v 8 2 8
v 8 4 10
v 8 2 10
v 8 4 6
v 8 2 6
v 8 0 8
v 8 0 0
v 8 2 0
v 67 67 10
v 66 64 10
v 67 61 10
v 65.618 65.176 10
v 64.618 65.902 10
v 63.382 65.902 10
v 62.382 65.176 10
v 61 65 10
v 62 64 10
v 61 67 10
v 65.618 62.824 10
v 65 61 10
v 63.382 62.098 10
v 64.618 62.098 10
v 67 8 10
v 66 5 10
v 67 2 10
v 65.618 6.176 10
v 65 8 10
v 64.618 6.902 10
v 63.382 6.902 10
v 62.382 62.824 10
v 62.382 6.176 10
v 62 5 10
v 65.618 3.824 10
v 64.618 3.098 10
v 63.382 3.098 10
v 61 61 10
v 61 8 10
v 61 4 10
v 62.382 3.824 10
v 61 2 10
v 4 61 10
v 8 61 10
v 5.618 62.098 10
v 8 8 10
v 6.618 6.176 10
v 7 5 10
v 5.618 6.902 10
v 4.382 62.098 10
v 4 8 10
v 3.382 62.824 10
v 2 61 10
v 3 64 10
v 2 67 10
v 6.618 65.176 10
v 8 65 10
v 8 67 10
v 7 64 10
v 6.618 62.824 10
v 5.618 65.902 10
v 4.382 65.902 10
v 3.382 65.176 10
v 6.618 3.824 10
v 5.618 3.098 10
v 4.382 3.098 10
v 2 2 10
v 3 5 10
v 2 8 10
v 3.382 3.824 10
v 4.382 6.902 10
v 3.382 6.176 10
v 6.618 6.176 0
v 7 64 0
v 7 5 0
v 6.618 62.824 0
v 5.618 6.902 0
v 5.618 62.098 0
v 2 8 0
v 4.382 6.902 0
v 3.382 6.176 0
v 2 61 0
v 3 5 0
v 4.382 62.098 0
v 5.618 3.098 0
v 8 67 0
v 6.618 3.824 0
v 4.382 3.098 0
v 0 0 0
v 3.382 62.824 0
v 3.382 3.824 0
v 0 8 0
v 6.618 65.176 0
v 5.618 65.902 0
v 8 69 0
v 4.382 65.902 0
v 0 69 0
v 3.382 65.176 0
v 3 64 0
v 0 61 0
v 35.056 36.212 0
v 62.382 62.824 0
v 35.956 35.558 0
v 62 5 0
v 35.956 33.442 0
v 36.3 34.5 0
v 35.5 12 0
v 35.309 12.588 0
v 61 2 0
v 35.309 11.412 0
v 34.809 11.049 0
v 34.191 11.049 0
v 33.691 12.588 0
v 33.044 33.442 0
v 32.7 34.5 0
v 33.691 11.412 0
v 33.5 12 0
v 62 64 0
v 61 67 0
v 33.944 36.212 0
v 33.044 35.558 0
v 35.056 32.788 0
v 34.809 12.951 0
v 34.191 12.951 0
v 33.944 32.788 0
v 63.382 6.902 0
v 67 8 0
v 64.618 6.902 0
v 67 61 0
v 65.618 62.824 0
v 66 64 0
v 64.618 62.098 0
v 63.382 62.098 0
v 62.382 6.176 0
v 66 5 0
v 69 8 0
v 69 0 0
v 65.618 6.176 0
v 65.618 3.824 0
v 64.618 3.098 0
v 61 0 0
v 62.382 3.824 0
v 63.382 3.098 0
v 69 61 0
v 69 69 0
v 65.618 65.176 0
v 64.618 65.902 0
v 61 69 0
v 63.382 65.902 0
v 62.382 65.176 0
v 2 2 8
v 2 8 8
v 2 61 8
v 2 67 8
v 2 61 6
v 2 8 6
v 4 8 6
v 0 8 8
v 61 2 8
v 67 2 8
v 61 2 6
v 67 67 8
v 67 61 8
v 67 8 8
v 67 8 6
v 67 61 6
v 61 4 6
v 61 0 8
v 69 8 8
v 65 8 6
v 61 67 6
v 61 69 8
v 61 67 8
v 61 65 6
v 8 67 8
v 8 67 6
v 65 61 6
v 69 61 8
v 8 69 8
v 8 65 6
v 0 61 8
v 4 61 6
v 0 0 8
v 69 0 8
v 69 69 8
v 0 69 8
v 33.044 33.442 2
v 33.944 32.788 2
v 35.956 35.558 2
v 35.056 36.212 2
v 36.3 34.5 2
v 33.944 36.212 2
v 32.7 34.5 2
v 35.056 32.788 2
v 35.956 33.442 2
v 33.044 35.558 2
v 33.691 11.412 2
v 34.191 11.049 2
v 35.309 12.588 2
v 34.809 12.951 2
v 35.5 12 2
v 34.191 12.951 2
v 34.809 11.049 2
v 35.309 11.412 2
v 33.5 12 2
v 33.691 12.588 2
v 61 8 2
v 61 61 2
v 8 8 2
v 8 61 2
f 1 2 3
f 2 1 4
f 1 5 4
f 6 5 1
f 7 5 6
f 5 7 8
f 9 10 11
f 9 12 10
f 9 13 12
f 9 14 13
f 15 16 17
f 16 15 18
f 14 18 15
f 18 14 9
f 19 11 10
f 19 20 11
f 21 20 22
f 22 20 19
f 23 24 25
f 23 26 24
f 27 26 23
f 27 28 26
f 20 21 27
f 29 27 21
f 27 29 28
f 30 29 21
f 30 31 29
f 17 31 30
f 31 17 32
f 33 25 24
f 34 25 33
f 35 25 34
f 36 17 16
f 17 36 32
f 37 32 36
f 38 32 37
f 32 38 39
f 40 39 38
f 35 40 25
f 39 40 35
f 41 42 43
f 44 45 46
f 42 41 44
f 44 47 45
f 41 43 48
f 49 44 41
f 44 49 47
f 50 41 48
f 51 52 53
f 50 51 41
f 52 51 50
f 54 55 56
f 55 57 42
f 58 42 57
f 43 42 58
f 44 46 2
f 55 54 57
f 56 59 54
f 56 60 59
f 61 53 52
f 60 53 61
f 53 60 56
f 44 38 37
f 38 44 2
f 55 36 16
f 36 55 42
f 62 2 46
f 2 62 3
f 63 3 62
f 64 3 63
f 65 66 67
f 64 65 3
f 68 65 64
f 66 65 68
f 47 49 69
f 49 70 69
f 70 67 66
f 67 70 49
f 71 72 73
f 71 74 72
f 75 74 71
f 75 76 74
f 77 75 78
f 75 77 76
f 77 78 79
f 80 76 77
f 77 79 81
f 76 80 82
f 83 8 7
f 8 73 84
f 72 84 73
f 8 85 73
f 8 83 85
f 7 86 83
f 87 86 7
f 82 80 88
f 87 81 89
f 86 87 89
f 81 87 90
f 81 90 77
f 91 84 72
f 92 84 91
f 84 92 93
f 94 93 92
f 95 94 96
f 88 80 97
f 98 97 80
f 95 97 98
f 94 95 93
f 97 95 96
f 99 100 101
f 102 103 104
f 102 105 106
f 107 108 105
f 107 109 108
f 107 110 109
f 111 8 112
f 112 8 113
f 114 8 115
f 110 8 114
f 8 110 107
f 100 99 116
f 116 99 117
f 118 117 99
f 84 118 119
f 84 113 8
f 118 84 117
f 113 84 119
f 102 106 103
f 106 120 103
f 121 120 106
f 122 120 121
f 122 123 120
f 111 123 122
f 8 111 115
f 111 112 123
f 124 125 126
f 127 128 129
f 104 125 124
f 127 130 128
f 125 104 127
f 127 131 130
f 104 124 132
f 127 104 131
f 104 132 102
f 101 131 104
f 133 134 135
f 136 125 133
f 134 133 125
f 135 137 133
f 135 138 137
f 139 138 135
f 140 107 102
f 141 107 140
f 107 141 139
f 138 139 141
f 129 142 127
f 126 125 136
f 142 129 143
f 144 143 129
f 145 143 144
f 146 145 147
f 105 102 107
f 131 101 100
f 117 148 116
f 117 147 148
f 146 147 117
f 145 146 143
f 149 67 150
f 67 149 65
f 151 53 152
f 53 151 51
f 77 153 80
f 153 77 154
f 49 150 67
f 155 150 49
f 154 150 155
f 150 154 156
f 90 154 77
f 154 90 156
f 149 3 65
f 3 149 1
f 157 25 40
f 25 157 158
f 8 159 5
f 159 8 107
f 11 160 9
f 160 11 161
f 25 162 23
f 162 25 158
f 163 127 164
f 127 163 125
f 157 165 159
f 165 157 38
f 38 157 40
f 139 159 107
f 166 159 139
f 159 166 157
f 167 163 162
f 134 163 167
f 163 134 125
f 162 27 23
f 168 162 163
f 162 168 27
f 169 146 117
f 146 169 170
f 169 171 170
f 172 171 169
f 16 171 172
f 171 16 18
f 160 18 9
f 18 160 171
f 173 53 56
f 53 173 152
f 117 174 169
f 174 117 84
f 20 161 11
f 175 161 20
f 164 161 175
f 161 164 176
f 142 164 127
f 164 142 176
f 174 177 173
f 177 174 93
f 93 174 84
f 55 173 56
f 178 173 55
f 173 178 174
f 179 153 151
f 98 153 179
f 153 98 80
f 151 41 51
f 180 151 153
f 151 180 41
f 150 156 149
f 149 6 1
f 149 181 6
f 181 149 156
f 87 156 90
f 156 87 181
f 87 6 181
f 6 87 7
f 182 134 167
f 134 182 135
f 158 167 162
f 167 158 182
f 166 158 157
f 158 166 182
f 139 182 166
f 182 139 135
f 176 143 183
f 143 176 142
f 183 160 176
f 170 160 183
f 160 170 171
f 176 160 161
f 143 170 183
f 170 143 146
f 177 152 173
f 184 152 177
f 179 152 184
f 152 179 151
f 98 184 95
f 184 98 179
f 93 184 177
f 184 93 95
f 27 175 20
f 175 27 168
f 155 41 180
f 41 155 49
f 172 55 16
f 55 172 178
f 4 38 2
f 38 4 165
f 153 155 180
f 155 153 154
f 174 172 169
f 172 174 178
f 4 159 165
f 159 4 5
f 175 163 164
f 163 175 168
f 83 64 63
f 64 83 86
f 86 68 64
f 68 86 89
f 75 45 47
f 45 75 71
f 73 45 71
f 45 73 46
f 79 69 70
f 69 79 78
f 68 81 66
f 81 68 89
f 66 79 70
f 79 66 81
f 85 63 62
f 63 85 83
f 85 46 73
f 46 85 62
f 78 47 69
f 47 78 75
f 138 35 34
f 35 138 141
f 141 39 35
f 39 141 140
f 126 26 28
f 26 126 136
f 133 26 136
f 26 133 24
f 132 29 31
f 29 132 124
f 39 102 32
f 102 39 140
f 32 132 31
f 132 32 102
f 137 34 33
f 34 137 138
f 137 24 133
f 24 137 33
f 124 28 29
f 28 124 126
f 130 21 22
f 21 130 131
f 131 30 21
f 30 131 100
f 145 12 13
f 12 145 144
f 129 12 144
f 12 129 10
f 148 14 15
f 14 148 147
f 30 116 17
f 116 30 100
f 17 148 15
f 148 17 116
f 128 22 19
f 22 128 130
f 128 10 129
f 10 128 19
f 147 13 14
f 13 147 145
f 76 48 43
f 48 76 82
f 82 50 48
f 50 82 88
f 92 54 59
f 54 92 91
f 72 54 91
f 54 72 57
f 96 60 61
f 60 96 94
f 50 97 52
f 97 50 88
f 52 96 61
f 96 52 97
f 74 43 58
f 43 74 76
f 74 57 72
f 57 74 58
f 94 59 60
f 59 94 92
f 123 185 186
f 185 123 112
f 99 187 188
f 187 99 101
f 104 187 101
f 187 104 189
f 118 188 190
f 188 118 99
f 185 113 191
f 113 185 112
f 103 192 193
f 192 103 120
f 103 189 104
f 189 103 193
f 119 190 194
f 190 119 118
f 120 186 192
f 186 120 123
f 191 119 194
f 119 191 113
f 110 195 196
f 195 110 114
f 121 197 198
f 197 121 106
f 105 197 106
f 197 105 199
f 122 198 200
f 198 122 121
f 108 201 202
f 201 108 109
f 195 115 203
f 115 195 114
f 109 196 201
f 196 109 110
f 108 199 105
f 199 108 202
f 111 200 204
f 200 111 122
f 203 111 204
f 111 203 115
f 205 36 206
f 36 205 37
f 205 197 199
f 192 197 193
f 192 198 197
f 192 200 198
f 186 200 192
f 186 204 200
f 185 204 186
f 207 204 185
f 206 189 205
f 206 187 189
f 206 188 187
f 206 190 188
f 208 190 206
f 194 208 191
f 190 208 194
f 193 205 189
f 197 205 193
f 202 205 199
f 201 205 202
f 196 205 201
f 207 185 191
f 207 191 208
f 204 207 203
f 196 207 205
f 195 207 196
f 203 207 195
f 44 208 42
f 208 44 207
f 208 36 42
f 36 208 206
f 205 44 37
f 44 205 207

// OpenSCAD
// Base unit

// Inputs
board_size = 50 + 3;
face_size = 4;
edge_size = 6;
corner_size = 8;
lid_holes_diameter = 4;
main_hole_diameter = 3.6;

rest_size = 3;

base_thickness = 2;
board_section_height = 5;
cap_section_height = 10;

// Parameters
face_xysize = board_size + (2 * face_size);
edge_xysize = board_size + (2 * edge_size);

face_offset = corner_size - face_size;
edge_offset = corner_size - edge_size;

total_height = 10;
points = [[0,0], [1,0], [1,1], [0,1]];
angles = [0,90,180, 270];

// Method
difference() {
    union() {
        // faces
        translate([face_offset, face_offset, 0]) {
            cube([face_xysize, face_xysize, total_height], false);
        }
        
        // bottom edges
        translate([edge_offset, edge_offset, 0]) {
           cube([edge_xysize, edge_xysize, edge_size], false);
        }
        
        // side edges
        for(i = [0:3]) {
                translate([edge_offset + (edge_size + board_size) * points[i][0], edge_offset + (edge_size + board_size) * points[i][1], 0]) { 
                    cube([edge_size, edge_size, total_height], false);
                }
        }
        
        // corners
        for(i = [0:3]) {
                translate([(corner_size + board_size) * points[i][0], (corner_size + board_size) * points[i][1], 0]) { 
                    cube([corner_size, corner_size, corner_size], false);
                }
        }
    }
    
    union() {
        // Main hole
        translate([corner_size + board_size / 2.0, corner_size + board_size / 2.0,-0.5]) {
            cylinder(d=main_hole_diameter, h=total_height, center=false, $fn=10);
        }
        
        // Main hole
        translate([corner_size + board_size / 2.0, 12,-0.5]) {
            cylinder(d=2, h=total_height, center=false, $fn=10);
        }
        
        // Hollow out for board
        translate([face_offset + face_size, face_offset + face_size, base_thickness]) {
           cube([board_size, board_size, total_height], false);
        }
        
        // side holes     
        lid_holes_offset = edge_offset + (edge_size/2);
        for(i = [0:3]) {
            
                translate([lid_holes_offset + (edge_size + board_size) * points[i][0], lid_holes_offset + (edge_size + board_size) * points[i][1], -0.5]) { 
                        cylinder(d=lid_holes_diameter, h=total_height + 1, center=false, $fn=10);
                }
        }
    }
}
